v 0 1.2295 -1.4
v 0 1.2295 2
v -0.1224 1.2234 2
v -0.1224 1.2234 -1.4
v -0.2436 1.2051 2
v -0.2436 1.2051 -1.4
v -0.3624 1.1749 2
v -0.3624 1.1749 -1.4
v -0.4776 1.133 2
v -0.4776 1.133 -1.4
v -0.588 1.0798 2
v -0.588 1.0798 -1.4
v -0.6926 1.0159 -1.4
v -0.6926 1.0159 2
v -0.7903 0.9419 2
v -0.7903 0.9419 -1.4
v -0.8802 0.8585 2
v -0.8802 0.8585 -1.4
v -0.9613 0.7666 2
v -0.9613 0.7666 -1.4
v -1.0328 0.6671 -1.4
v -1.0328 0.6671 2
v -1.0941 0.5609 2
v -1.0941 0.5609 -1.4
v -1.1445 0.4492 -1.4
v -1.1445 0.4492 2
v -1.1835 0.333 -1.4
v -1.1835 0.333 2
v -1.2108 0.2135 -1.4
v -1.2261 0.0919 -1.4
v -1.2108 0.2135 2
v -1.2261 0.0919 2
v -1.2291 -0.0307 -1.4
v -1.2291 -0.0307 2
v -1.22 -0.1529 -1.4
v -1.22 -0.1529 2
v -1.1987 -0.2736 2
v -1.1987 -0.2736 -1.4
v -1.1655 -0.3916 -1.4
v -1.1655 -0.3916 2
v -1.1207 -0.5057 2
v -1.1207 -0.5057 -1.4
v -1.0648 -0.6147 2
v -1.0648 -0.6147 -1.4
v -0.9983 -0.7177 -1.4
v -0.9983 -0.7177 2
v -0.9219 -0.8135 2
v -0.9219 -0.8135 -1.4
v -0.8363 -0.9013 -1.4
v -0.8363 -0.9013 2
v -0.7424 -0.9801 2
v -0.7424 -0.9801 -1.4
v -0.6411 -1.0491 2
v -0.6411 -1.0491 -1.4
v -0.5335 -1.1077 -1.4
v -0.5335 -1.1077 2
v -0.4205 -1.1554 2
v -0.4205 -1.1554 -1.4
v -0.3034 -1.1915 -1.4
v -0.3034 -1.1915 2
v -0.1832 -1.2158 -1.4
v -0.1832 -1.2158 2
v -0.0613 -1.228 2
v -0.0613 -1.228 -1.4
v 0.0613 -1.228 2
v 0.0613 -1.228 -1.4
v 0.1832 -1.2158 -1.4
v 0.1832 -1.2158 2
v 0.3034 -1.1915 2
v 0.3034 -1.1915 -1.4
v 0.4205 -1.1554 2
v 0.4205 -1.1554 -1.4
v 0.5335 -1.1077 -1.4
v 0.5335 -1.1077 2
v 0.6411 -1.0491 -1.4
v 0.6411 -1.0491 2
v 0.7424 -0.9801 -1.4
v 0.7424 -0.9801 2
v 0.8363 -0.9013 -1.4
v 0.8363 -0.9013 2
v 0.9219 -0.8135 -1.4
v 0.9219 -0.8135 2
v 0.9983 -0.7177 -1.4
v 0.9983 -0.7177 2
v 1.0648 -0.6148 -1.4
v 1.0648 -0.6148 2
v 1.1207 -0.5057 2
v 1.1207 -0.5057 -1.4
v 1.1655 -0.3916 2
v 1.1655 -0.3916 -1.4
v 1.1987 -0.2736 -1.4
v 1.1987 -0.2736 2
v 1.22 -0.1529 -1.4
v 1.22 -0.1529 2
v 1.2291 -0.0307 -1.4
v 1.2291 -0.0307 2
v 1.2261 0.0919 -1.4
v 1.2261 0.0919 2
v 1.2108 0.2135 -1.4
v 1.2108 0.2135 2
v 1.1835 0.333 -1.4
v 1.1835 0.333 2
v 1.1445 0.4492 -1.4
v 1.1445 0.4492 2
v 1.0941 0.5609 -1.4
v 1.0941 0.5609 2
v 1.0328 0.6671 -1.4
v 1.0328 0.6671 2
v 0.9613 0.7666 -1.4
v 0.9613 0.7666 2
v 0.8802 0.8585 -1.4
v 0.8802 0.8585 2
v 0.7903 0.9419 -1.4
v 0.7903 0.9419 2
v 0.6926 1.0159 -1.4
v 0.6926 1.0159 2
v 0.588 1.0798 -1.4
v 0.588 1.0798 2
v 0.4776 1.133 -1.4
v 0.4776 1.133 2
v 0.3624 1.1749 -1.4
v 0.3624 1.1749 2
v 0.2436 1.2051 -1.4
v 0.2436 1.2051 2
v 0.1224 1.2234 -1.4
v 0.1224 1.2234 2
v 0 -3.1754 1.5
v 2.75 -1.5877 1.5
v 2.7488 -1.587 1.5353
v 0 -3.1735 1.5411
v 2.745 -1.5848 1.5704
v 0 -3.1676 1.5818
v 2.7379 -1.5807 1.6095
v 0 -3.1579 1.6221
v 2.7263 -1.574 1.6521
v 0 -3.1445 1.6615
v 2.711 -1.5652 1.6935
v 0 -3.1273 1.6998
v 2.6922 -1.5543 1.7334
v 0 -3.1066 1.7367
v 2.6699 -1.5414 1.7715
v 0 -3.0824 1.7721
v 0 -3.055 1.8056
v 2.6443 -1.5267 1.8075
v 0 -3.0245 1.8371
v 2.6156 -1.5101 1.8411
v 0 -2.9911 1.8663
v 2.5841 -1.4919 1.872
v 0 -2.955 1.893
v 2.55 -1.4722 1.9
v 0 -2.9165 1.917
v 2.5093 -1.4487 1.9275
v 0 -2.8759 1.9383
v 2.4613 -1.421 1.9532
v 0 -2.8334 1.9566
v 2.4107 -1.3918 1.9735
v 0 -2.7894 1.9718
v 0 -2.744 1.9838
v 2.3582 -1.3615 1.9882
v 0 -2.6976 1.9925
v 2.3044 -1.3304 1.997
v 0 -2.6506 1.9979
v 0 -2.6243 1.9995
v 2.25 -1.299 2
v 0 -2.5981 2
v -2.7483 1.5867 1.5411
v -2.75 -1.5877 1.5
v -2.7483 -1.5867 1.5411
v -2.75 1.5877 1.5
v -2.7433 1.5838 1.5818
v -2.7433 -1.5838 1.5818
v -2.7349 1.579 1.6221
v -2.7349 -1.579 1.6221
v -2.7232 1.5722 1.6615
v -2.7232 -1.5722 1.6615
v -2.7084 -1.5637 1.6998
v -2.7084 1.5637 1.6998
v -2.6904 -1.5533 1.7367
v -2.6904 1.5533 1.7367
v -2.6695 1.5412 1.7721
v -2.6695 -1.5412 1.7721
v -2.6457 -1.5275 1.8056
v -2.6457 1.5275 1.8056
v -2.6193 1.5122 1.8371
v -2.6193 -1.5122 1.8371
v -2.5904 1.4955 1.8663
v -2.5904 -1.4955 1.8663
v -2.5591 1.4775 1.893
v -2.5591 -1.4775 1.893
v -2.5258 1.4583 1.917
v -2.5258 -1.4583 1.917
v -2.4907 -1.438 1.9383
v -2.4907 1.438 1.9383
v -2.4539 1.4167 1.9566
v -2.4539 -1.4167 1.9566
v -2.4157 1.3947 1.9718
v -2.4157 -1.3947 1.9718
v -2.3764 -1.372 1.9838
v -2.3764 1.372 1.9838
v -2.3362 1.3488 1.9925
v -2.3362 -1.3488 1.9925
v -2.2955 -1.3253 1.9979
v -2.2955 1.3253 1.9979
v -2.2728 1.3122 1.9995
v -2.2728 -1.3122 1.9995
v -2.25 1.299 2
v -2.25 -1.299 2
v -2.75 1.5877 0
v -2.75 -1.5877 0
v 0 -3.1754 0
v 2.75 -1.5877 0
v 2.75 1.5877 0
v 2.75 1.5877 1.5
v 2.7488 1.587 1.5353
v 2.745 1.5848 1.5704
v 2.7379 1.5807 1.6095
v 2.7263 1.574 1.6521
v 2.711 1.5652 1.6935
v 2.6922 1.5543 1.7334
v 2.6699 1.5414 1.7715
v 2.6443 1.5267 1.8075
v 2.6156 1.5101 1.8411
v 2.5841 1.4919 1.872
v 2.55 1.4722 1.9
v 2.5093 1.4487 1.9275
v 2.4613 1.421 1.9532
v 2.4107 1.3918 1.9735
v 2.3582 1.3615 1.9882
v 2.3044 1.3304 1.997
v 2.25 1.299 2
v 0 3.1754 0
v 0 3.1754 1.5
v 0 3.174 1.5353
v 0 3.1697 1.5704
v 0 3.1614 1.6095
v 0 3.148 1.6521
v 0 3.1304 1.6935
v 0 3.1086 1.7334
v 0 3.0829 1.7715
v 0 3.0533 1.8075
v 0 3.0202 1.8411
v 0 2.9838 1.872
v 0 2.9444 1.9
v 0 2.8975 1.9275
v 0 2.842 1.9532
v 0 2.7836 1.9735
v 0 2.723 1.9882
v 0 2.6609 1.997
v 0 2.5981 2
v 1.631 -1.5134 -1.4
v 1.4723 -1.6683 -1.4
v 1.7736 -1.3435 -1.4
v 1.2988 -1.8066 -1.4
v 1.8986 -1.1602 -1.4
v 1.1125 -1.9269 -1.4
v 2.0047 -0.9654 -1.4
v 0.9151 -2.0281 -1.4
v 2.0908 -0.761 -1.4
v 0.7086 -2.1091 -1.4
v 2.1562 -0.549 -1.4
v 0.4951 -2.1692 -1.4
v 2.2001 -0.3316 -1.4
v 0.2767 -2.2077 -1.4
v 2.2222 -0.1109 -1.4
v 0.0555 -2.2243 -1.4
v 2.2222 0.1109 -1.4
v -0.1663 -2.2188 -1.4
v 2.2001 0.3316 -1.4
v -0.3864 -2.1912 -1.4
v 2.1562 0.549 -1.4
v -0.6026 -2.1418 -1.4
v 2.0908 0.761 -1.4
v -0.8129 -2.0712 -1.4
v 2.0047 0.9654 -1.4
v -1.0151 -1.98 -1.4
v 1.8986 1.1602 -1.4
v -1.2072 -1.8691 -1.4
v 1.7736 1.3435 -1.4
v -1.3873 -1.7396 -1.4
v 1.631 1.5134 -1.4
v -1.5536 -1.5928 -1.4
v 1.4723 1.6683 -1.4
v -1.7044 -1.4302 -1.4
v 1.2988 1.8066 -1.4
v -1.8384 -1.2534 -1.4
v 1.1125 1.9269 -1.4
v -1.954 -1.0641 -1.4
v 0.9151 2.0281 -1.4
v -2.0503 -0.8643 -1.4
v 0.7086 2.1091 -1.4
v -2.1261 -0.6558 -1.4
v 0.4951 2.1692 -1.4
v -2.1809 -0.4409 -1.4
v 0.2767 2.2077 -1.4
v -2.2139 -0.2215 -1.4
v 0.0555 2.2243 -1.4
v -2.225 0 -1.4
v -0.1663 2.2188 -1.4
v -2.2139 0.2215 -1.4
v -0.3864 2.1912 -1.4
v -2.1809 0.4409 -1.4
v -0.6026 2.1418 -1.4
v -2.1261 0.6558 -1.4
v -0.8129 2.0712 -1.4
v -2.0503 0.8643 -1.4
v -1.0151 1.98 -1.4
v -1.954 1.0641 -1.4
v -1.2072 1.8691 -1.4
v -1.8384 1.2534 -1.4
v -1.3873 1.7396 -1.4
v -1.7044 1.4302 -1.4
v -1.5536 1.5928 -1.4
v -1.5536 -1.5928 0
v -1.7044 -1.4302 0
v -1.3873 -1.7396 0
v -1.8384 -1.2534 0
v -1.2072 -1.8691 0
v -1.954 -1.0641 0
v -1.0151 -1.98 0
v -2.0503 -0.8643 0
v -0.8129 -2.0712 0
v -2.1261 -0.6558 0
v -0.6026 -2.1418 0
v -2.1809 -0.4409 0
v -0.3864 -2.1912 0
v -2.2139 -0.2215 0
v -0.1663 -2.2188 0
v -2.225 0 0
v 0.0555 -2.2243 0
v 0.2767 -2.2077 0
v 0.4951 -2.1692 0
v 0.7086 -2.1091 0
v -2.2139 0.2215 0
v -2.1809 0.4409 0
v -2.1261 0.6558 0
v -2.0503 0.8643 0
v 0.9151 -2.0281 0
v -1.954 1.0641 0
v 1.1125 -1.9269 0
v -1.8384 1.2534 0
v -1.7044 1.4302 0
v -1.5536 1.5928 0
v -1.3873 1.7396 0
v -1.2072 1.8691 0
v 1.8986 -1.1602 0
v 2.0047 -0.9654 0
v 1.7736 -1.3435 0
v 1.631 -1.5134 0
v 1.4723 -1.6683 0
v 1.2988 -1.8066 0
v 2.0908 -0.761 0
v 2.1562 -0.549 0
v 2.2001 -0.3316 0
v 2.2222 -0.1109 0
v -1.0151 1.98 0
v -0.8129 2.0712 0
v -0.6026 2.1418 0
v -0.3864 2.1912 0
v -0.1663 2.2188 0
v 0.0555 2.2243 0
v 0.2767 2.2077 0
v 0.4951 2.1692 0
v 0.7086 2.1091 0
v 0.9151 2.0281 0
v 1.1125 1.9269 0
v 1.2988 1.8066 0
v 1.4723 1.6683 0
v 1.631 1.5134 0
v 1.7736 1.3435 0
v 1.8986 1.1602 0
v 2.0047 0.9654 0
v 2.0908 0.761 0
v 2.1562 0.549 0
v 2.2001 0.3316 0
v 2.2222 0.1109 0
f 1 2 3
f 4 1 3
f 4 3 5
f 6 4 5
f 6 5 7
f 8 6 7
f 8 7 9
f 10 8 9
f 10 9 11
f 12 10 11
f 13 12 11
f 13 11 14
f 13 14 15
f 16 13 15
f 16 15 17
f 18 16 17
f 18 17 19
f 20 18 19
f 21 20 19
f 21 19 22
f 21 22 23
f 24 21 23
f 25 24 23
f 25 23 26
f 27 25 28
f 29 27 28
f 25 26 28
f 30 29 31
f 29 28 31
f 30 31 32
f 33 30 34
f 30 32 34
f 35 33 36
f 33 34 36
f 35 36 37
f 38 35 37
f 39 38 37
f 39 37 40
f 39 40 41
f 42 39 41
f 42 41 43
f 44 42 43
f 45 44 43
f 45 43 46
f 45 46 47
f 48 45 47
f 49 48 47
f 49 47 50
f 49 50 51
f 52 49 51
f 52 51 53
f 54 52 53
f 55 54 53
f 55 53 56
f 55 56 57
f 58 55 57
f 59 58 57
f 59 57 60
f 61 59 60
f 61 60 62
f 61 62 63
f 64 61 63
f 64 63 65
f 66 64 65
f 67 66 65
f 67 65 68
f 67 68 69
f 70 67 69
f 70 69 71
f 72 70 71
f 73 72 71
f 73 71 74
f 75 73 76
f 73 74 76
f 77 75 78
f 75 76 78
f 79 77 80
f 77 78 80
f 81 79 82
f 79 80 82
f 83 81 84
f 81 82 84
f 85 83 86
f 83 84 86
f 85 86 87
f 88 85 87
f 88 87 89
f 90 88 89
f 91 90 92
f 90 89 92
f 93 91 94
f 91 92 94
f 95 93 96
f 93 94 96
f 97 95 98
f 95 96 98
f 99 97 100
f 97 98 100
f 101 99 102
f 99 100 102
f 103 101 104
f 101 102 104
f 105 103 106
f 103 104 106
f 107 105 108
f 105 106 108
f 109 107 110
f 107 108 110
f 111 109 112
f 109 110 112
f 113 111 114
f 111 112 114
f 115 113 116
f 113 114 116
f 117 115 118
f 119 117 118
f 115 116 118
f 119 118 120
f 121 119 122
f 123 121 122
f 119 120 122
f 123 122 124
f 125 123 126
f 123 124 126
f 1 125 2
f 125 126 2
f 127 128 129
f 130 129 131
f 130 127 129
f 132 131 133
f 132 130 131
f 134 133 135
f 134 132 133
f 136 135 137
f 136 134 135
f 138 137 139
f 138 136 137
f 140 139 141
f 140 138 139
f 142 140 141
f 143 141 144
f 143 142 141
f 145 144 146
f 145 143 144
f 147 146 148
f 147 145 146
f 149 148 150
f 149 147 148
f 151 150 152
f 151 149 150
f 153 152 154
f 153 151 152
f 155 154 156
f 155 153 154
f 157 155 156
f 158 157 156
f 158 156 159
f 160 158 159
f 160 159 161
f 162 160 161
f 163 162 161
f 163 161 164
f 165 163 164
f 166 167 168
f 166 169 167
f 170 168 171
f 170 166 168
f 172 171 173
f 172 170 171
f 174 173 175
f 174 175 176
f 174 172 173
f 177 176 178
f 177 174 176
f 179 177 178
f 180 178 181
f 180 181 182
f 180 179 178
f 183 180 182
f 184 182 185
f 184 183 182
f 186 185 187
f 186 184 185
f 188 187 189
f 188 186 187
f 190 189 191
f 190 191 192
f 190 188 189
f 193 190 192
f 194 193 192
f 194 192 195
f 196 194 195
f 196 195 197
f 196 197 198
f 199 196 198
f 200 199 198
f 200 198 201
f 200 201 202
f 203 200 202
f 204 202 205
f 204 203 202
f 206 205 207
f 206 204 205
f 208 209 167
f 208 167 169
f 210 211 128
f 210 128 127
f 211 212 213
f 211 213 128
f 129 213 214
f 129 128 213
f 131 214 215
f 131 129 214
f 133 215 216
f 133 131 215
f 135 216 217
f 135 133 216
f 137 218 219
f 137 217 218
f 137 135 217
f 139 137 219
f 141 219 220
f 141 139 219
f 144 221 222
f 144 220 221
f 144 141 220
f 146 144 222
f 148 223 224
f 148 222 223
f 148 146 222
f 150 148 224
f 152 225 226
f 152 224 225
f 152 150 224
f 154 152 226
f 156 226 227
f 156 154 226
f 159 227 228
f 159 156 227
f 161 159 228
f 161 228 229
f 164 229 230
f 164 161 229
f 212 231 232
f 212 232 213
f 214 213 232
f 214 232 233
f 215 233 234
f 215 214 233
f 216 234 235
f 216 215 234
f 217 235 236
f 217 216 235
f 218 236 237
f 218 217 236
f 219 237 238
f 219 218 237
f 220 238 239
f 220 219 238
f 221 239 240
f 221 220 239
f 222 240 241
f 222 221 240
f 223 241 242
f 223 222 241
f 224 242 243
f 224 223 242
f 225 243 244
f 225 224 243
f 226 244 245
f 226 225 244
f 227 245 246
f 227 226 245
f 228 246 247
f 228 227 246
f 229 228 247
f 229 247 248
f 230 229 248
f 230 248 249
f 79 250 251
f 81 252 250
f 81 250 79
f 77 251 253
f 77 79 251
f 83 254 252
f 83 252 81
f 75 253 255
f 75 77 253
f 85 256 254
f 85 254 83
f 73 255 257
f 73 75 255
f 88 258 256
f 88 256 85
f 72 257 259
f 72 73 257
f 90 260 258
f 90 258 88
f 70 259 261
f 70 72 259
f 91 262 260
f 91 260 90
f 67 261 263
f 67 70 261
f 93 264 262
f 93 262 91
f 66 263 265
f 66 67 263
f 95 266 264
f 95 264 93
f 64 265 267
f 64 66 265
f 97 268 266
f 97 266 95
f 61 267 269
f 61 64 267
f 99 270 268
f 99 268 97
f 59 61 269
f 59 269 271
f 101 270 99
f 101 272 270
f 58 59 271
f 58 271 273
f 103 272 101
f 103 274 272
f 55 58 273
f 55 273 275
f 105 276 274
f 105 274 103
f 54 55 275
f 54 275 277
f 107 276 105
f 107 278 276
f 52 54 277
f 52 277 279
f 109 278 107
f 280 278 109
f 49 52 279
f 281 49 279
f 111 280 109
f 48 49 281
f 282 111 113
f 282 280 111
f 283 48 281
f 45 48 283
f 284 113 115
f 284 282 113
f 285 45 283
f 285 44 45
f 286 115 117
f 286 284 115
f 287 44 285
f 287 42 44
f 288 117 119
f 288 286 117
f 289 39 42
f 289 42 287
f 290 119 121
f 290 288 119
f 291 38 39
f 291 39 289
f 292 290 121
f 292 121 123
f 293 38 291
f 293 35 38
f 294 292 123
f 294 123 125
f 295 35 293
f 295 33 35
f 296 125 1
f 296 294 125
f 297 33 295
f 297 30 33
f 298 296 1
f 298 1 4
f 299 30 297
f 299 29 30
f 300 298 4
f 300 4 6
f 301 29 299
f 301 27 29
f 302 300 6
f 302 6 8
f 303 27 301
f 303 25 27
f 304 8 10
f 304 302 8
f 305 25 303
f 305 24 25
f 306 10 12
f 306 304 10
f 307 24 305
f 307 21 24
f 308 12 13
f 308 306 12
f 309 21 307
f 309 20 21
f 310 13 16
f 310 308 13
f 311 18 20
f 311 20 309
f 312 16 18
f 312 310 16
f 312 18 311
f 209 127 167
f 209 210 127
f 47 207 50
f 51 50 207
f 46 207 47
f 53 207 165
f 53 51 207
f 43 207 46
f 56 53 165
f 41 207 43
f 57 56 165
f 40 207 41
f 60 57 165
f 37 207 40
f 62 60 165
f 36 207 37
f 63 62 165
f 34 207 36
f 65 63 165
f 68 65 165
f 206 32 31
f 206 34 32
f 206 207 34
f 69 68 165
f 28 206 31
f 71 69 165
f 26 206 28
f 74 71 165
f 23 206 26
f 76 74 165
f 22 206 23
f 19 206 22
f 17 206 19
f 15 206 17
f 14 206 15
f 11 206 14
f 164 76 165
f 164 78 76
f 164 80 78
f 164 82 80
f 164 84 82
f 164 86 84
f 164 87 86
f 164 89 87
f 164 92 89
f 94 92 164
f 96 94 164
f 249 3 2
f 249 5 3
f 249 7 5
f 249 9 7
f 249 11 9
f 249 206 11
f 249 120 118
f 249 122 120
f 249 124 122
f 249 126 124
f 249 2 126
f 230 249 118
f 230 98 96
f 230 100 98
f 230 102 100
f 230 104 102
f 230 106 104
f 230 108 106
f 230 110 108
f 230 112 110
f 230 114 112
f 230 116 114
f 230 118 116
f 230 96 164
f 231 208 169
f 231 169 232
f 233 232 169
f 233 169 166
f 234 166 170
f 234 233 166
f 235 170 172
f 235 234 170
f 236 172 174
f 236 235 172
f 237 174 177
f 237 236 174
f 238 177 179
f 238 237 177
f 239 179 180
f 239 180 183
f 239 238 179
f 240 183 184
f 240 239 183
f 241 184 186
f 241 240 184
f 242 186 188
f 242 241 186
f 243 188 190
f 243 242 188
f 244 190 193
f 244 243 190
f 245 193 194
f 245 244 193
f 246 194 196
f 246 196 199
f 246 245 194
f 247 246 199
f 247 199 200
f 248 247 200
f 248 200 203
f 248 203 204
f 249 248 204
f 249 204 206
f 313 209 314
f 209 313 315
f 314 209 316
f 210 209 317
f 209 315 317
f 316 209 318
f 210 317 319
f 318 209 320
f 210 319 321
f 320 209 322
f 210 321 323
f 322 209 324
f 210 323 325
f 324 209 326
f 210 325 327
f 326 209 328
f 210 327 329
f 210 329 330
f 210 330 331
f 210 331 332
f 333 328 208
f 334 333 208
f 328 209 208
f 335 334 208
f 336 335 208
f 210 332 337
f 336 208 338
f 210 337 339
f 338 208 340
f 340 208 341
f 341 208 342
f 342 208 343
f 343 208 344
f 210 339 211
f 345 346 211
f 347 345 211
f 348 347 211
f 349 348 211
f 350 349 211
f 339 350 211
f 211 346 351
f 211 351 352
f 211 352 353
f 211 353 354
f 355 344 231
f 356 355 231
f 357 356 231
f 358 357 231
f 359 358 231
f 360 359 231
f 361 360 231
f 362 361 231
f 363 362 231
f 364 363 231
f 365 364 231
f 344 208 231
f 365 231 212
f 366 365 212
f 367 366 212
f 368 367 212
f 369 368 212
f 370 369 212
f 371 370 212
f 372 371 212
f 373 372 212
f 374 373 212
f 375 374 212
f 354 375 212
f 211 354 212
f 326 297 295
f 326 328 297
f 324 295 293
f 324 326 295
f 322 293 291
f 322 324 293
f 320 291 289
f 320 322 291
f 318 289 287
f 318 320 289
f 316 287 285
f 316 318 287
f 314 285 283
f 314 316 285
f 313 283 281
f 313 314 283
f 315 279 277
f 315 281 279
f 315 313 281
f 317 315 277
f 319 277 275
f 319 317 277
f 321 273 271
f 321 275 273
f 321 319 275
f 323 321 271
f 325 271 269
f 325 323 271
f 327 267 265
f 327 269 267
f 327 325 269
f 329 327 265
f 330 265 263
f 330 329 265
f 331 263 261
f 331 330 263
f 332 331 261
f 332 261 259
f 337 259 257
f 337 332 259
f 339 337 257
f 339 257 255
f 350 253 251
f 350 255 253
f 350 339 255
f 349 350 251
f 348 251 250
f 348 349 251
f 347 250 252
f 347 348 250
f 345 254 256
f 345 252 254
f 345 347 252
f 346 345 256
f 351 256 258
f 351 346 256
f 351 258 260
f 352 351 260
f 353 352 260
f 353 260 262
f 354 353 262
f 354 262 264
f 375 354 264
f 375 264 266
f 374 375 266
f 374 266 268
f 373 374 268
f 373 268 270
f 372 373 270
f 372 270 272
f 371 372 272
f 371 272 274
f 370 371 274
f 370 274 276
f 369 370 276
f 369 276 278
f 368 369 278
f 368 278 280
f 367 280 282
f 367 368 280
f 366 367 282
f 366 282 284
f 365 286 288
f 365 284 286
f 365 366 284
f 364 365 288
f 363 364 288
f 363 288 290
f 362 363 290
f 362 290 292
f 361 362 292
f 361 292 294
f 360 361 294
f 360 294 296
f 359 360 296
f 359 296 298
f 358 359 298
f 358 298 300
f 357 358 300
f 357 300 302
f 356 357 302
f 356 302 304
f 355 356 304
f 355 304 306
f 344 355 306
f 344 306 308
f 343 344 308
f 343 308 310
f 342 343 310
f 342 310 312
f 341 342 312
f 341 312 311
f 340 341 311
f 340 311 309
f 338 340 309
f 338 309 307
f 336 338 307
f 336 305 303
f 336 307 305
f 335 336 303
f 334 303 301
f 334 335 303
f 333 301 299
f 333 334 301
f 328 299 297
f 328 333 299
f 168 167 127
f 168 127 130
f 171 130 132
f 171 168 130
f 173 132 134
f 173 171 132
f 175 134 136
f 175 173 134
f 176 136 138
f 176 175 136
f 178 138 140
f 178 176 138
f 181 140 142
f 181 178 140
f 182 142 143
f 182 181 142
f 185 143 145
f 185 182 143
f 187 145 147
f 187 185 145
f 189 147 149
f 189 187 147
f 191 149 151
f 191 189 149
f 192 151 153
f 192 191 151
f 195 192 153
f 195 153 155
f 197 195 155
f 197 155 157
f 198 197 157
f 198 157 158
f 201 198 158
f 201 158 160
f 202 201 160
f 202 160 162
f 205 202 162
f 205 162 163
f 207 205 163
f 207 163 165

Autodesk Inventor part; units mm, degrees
ref_plane "YZ Plane" through (0, 0, 0) normal (1, 0, 0) x (0, 1, 0)
ref_plane "XZ Plane" through (0, 0, 0) normal (0, 1, 0) x (-1, 0, 0)
ref_plane "XY Plane" through (0, 0, 0) normal (0, 0, 1) x (1, 0, 0)
sketch "スケッチ1" plane through (0, 0, 0) normal (0, 0, 1) x (1, 0, 0)
  line L0 (0, -3.1754) -> (-2.75, -1.5877)
  line L1 (-2.75, -1.5877) -> (-2.75, 1.5877)
  line L2 (-2.75, 1.5877) -> (0, 3.1754)
  line L3 (0, 3.1754) -> (2.75, 1.5877)
  line L4 (2.75, 1.5877) -> (2.75, -1.5877)
  line L5 (2.75, -1.5877) -> (0, -3.1754)
  point P0 (0, 0)
  point P1 (0, 0)
  dimension "d0" = 5.5
extrude "押し出し1" add sketch "スケッチ1" along normal blind 2
sketch "スケッチ2" plane through (0, 0, 0) normal (0, 0, -1) x (-1, 0, 0)
  circle A0 centre (0, 0) radius 2.225
  dimension "d3" = 4.45
extrude "押し出し2" add sketch "スケッチ2" along normal blind 1.4
sketch "スケッチ3" plane through (0, 0, -1.4) normal (0, 0, -1) x (-1, 0, 0)
  point P0 (0, 0)
hole "穴1" at (0, 0, -1.4) direction (0, 0, 1) diameter 2.459 end through all thread size "M3x0.5" class "6H" standard "ISO Metric profile"
fillet "フィレット1" radius 0.5 6 edges at (1.375, 2.3816, 2) (2.75, 0, 2) (1.375, -2.3816, 2) (-1.375, -2.3816, 2) (-2.75, 0, 2) (-1.375, 2.3816, 2)
properties part number "BOB-M3-2-3W"
